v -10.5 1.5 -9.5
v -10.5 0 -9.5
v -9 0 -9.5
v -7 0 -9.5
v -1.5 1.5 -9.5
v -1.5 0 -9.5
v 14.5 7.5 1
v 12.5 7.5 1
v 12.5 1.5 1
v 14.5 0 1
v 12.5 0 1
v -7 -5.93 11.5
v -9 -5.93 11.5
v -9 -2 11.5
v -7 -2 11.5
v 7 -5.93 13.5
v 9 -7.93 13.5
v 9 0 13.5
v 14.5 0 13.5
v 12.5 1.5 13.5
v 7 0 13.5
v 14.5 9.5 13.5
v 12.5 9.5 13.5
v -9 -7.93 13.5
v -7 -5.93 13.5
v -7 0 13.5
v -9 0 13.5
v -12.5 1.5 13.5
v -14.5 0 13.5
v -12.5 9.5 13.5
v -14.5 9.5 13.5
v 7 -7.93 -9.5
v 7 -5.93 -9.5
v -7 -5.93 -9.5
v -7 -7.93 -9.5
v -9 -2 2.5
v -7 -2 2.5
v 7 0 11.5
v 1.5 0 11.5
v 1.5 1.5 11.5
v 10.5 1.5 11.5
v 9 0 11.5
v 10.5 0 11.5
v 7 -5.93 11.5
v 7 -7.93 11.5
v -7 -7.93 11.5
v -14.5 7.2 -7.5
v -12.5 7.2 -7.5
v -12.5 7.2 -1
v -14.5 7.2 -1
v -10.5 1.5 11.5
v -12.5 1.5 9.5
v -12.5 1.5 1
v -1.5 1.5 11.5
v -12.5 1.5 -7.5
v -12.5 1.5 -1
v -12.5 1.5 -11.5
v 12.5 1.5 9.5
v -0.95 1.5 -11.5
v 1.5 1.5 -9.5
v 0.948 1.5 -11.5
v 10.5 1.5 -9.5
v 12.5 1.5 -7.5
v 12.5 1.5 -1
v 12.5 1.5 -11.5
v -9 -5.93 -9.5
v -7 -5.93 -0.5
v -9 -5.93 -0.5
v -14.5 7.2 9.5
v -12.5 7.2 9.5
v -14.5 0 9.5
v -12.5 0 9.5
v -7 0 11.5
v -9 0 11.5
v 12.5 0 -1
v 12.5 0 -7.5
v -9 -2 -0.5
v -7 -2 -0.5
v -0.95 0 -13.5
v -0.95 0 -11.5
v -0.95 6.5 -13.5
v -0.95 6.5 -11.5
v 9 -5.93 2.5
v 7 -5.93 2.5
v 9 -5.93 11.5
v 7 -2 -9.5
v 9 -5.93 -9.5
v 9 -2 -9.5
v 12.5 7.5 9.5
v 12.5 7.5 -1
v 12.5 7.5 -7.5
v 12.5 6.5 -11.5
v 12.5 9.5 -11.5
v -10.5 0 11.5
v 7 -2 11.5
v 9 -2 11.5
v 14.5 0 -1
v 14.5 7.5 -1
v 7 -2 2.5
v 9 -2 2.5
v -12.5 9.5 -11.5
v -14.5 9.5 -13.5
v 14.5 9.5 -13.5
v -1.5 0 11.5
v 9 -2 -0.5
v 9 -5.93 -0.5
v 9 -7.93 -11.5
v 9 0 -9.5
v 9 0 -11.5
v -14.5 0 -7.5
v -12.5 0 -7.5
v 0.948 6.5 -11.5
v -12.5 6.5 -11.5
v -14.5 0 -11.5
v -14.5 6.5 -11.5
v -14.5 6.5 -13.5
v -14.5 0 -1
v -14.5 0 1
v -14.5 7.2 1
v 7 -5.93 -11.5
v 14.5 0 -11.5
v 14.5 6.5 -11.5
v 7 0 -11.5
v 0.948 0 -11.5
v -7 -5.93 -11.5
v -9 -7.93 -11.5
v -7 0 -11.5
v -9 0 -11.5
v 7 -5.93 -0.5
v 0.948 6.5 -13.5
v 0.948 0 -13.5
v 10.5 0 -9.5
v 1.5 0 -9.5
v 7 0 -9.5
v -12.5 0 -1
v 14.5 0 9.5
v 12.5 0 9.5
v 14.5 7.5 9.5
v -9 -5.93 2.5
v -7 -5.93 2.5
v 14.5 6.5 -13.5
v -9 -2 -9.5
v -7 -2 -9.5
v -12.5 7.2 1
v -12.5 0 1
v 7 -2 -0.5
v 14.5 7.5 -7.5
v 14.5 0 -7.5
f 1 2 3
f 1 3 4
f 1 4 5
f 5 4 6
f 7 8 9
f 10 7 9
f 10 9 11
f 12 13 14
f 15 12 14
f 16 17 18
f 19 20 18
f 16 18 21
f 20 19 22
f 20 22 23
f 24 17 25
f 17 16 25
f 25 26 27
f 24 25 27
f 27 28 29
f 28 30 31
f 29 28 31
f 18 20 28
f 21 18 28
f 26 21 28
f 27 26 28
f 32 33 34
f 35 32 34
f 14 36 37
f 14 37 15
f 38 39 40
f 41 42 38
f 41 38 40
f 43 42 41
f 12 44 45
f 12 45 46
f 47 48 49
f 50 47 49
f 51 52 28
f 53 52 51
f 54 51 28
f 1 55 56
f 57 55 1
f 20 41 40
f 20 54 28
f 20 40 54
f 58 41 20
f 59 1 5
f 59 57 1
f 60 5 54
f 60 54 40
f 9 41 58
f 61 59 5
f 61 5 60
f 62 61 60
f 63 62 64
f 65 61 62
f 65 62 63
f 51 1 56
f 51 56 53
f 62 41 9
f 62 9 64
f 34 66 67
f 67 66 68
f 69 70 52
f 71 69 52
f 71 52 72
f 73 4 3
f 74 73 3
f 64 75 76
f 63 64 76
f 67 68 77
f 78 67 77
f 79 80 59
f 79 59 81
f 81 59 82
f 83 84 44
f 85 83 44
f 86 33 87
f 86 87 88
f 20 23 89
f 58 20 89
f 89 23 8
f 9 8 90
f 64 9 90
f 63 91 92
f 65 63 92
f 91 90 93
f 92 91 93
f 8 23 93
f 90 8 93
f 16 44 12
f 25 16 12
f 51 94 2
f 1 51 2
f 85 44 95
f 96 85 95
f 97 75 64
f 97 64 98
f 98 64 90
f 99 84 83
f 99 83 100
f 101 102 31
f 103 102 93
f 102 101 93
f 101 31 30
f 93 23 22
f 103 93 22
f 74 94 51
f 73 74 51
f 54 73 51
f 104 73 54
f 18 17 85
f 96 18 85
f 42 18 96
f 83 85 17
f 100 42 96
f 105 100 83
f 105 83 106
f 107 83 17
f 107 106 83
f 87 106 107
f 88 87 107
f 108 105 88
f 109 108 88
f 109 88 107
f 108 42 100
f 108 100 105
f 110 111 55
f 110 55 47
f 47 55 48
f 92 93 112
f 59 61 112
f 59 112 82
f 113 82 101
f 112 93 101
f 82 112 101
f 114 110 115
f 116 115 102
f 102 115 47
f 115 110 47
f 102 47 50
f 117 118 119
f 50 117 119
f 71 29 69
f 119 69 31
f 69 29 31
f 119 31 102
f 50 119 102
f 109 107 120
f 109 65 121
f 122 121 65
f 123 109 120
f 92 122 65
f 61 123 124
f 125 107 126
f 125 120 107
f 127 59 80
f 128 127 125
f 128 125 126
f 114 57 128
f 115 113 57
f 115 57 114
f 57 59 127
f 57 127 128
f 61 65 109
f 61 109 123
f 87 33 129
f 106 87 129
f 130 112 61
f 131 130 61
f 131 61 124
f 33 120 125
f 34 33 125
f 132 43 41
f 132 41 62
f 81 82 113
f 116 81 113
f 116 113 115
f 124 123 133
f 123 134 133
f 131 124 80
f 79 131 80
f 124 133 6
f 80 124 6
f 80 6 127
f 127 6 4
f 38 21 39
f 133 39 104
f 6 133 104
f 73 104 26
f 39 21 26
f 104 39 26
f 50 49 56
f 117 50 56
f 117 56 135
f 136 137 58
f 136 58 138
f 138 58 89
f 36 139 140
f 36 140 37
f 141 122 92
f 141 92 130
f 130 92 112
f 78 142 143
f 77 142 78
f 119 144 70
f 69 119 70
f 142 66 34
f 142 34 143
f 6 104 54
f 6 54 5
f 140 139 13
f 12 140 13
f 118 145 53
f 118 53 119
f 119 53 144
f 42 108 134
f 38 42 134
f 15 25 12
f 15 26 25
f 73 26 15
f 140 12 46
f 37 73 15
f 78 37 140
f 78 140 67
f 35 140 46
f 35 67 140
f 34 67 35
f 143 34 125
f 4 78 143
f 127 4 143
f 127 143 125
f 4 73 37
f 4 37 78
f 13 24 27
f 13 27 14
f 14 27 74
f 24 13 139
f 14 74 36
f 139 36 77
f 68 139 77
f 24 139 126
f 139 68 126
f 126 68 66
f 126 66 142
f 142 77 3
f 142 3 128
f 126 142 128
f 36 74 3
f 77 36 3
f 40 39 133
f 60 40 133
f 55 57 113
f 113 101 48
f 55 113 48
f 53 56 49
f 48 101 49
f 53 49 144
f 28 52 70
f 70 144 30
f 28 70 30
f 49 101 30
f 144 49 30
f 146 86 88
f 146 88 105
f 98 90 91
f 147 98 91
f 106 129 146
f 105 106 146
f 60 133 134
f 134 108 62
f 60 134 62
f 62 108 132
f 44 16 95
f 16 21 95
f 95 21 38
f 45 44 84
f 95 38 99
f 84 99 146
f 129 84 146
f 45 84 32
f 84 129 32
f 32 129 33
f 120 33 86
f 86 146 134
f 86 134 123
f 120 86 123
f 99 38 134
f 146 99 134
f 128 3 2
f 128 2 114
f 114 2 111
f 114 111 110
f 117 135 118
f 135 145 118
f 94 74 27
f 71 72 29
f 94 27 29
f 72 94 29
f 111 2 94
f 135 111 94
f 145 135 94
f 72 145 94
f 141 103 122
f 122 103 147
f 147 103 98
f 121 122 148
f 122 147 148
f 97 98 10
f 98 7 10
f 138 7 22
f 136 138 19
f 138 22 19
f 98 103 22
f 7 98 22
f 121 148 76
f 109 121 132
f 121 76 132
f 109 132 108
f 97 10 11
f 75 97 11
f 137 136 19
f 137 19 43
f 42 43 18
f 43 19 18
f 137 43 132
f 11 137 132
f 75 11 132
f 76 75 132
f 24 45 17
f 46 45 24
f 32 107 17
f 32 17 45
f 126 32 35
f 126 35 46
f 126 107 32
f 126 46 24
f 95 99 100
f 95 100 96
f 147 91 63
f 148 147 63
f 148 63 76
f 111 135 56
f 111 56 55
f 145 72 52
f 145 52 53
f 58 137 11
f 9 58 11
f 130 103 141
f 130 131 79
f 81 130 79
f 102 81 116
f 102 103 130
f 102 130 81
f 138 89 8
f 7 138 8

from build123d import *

# Parameters (mm, degrees)
SKETCH1_W            = 25
SKETCH1_H            = 25
SKETCH1_W_2          = 9
SKETCH1_H_2          = 21
BOSS_EXTRUDE1_DEPTH  = 1.5
BOSS_EXTRUDE2_DEPTH  = 2
BOSS_EXTRUDE3_DEPTH  = 2
BOSS_EXTRUDE8_DEPTH  = 2
SKETCH12_W           = 2
SKETCH12_H           = 25
BOSS_EXTRUDE10_DEPTH = 5.93
SKETCH11_W           = 18
SKETCH11_H           = 25
SKETCH11_W_2         = 14
SKETCH11_H_2         = 21
BOSS_EXTRUDE11_DEPTH = 2
SKETCH13_W           = 9
SKETCH13_H           = 3.93
CUT_EXTRUDE2_DEPTH   = 24.5


with BuildPart() as part:
    # Sketch1 → Boss-Extrude1 (new body)
    with BuildSketch(Plane(origin=(0, 0, 0), x_dir=(1, 0, 0), z_dir=(0, 1, 0))):
        with Locations((0, -1)):
            Rectangle(SKETCH1_W, SKETCH1_H)
        with Locations((-6, -1)):
            Rectangle(SKETCH1_W_2, SKETCH1_H_2, mode=Mode.SUBTRACT)
        with Locations((6, -1)):
            Rectangle(SKETCH1_W_2, SKETCH1_H_2, mode=Mode.SUBTRACT)
    extrude(amount=BOSS_EXTRUDE1_DEPTH)

    # Sketch2 → Boss-Extrude2 (add)
    with BuildSketch(Plane(origin=(12.5, 0, 0), x_dir=(0, 0, -1), z_dir=(1, 0, 0))):
        Polygon((-9.5, 7.5), (-1, 7.5), (-1, 0), (1, 0), (1, 7.5), (7.5, 7.5), (7.5, 0), (11.5, 0), (11.5, 9.5), (-13.5, 9.5), (-13.5, 0), (-9.5, 0), align=None)
    extrude(amount=BOSS_EXTRUDE2_DEPTH)

    # Sketch3 → Boss-Extrude3 (add)
    with BuildSketch(Plane.ZY.offset(12.5)):
        Polygon((1, 0), (1, 7.2), (9.5, 7.2), (9.5, 0), (13.5, 0), (13.5, 9.5), (-11.5, 9.5), (-11.5, 0), (-7.5, 0), (-7.5, 7.2), (-1, 7.2), (-1, 0), align=None)
    extrude(amount=BOSS_EXTRUDE3_DEPTH)

    # Sketch10 → Boss-Extrude8 (add)
    with BuildSketch(Plane(origin=(0, 0, -11.5), x_dir=(-1, 0, 0), z_dir=(0, 0, -1))):
        Polygon((14.5, 9.5), (-14.5, 9.5), (-14.5, 6.5), (-0.948009726, 6.5), (-0.948009726, 0), (0.95, 0), (0.95, 6.5), (14.5, 6.5), align=None)
    extrude(amount=BOSS_EXTRUDE8_DEPTH)

    # Sketch12 → Boss-Extrude10 (add)
    with BuildSketch(Plane(origin=(0, 0, 0), x_dir=(-1, 0, 0), z_dir=(0, -1, 0))):
        with Locations((-8, -1)):
            Rectangle(SKETCH12_W, SKETCH12_H)
        with Locations((8, -1)):
            Rectangle(SKETCH12_W, SKETCH12_H)
    extrude(amount=BOSS_EXTRUDE10_DEPTH)

    # Sketch11 → Boss-Extrude11 (add)
    with BuildSketch(Plane(origin=(0, -5.93, 0), x_dir=(-1, 0, 0), z_dir=(0, -1, 0))):
        with Locations((0, -1)):
            Rectangle(SKETCH11_W, SKETCH11_H)
        with Locations((0, -1)):
            Rectangle(SKETCH11_W_2, SKETCH11_H_2, mode=Mode.SUBTRACT)
    extrude(amount=BOSS_EXTRUDE11_DEPTH)

    # Sketch13 → Cut-Extrude2 (cut, through all)
    with BuildSketch(Plane.ZY.offset(9)):
        with Locations((-5, -3.965)):
            Rectangle(SKETCH13_W, SKETCH13_H)
        with Locations((7, -3.965)):
            Rectangle(SKETCH13_W, SKETCH13_H)
    extrude(amount=-CUT_EXTRUDE2_DEPTH, mode=Mode.SUBTRACT)


solid = part.part
